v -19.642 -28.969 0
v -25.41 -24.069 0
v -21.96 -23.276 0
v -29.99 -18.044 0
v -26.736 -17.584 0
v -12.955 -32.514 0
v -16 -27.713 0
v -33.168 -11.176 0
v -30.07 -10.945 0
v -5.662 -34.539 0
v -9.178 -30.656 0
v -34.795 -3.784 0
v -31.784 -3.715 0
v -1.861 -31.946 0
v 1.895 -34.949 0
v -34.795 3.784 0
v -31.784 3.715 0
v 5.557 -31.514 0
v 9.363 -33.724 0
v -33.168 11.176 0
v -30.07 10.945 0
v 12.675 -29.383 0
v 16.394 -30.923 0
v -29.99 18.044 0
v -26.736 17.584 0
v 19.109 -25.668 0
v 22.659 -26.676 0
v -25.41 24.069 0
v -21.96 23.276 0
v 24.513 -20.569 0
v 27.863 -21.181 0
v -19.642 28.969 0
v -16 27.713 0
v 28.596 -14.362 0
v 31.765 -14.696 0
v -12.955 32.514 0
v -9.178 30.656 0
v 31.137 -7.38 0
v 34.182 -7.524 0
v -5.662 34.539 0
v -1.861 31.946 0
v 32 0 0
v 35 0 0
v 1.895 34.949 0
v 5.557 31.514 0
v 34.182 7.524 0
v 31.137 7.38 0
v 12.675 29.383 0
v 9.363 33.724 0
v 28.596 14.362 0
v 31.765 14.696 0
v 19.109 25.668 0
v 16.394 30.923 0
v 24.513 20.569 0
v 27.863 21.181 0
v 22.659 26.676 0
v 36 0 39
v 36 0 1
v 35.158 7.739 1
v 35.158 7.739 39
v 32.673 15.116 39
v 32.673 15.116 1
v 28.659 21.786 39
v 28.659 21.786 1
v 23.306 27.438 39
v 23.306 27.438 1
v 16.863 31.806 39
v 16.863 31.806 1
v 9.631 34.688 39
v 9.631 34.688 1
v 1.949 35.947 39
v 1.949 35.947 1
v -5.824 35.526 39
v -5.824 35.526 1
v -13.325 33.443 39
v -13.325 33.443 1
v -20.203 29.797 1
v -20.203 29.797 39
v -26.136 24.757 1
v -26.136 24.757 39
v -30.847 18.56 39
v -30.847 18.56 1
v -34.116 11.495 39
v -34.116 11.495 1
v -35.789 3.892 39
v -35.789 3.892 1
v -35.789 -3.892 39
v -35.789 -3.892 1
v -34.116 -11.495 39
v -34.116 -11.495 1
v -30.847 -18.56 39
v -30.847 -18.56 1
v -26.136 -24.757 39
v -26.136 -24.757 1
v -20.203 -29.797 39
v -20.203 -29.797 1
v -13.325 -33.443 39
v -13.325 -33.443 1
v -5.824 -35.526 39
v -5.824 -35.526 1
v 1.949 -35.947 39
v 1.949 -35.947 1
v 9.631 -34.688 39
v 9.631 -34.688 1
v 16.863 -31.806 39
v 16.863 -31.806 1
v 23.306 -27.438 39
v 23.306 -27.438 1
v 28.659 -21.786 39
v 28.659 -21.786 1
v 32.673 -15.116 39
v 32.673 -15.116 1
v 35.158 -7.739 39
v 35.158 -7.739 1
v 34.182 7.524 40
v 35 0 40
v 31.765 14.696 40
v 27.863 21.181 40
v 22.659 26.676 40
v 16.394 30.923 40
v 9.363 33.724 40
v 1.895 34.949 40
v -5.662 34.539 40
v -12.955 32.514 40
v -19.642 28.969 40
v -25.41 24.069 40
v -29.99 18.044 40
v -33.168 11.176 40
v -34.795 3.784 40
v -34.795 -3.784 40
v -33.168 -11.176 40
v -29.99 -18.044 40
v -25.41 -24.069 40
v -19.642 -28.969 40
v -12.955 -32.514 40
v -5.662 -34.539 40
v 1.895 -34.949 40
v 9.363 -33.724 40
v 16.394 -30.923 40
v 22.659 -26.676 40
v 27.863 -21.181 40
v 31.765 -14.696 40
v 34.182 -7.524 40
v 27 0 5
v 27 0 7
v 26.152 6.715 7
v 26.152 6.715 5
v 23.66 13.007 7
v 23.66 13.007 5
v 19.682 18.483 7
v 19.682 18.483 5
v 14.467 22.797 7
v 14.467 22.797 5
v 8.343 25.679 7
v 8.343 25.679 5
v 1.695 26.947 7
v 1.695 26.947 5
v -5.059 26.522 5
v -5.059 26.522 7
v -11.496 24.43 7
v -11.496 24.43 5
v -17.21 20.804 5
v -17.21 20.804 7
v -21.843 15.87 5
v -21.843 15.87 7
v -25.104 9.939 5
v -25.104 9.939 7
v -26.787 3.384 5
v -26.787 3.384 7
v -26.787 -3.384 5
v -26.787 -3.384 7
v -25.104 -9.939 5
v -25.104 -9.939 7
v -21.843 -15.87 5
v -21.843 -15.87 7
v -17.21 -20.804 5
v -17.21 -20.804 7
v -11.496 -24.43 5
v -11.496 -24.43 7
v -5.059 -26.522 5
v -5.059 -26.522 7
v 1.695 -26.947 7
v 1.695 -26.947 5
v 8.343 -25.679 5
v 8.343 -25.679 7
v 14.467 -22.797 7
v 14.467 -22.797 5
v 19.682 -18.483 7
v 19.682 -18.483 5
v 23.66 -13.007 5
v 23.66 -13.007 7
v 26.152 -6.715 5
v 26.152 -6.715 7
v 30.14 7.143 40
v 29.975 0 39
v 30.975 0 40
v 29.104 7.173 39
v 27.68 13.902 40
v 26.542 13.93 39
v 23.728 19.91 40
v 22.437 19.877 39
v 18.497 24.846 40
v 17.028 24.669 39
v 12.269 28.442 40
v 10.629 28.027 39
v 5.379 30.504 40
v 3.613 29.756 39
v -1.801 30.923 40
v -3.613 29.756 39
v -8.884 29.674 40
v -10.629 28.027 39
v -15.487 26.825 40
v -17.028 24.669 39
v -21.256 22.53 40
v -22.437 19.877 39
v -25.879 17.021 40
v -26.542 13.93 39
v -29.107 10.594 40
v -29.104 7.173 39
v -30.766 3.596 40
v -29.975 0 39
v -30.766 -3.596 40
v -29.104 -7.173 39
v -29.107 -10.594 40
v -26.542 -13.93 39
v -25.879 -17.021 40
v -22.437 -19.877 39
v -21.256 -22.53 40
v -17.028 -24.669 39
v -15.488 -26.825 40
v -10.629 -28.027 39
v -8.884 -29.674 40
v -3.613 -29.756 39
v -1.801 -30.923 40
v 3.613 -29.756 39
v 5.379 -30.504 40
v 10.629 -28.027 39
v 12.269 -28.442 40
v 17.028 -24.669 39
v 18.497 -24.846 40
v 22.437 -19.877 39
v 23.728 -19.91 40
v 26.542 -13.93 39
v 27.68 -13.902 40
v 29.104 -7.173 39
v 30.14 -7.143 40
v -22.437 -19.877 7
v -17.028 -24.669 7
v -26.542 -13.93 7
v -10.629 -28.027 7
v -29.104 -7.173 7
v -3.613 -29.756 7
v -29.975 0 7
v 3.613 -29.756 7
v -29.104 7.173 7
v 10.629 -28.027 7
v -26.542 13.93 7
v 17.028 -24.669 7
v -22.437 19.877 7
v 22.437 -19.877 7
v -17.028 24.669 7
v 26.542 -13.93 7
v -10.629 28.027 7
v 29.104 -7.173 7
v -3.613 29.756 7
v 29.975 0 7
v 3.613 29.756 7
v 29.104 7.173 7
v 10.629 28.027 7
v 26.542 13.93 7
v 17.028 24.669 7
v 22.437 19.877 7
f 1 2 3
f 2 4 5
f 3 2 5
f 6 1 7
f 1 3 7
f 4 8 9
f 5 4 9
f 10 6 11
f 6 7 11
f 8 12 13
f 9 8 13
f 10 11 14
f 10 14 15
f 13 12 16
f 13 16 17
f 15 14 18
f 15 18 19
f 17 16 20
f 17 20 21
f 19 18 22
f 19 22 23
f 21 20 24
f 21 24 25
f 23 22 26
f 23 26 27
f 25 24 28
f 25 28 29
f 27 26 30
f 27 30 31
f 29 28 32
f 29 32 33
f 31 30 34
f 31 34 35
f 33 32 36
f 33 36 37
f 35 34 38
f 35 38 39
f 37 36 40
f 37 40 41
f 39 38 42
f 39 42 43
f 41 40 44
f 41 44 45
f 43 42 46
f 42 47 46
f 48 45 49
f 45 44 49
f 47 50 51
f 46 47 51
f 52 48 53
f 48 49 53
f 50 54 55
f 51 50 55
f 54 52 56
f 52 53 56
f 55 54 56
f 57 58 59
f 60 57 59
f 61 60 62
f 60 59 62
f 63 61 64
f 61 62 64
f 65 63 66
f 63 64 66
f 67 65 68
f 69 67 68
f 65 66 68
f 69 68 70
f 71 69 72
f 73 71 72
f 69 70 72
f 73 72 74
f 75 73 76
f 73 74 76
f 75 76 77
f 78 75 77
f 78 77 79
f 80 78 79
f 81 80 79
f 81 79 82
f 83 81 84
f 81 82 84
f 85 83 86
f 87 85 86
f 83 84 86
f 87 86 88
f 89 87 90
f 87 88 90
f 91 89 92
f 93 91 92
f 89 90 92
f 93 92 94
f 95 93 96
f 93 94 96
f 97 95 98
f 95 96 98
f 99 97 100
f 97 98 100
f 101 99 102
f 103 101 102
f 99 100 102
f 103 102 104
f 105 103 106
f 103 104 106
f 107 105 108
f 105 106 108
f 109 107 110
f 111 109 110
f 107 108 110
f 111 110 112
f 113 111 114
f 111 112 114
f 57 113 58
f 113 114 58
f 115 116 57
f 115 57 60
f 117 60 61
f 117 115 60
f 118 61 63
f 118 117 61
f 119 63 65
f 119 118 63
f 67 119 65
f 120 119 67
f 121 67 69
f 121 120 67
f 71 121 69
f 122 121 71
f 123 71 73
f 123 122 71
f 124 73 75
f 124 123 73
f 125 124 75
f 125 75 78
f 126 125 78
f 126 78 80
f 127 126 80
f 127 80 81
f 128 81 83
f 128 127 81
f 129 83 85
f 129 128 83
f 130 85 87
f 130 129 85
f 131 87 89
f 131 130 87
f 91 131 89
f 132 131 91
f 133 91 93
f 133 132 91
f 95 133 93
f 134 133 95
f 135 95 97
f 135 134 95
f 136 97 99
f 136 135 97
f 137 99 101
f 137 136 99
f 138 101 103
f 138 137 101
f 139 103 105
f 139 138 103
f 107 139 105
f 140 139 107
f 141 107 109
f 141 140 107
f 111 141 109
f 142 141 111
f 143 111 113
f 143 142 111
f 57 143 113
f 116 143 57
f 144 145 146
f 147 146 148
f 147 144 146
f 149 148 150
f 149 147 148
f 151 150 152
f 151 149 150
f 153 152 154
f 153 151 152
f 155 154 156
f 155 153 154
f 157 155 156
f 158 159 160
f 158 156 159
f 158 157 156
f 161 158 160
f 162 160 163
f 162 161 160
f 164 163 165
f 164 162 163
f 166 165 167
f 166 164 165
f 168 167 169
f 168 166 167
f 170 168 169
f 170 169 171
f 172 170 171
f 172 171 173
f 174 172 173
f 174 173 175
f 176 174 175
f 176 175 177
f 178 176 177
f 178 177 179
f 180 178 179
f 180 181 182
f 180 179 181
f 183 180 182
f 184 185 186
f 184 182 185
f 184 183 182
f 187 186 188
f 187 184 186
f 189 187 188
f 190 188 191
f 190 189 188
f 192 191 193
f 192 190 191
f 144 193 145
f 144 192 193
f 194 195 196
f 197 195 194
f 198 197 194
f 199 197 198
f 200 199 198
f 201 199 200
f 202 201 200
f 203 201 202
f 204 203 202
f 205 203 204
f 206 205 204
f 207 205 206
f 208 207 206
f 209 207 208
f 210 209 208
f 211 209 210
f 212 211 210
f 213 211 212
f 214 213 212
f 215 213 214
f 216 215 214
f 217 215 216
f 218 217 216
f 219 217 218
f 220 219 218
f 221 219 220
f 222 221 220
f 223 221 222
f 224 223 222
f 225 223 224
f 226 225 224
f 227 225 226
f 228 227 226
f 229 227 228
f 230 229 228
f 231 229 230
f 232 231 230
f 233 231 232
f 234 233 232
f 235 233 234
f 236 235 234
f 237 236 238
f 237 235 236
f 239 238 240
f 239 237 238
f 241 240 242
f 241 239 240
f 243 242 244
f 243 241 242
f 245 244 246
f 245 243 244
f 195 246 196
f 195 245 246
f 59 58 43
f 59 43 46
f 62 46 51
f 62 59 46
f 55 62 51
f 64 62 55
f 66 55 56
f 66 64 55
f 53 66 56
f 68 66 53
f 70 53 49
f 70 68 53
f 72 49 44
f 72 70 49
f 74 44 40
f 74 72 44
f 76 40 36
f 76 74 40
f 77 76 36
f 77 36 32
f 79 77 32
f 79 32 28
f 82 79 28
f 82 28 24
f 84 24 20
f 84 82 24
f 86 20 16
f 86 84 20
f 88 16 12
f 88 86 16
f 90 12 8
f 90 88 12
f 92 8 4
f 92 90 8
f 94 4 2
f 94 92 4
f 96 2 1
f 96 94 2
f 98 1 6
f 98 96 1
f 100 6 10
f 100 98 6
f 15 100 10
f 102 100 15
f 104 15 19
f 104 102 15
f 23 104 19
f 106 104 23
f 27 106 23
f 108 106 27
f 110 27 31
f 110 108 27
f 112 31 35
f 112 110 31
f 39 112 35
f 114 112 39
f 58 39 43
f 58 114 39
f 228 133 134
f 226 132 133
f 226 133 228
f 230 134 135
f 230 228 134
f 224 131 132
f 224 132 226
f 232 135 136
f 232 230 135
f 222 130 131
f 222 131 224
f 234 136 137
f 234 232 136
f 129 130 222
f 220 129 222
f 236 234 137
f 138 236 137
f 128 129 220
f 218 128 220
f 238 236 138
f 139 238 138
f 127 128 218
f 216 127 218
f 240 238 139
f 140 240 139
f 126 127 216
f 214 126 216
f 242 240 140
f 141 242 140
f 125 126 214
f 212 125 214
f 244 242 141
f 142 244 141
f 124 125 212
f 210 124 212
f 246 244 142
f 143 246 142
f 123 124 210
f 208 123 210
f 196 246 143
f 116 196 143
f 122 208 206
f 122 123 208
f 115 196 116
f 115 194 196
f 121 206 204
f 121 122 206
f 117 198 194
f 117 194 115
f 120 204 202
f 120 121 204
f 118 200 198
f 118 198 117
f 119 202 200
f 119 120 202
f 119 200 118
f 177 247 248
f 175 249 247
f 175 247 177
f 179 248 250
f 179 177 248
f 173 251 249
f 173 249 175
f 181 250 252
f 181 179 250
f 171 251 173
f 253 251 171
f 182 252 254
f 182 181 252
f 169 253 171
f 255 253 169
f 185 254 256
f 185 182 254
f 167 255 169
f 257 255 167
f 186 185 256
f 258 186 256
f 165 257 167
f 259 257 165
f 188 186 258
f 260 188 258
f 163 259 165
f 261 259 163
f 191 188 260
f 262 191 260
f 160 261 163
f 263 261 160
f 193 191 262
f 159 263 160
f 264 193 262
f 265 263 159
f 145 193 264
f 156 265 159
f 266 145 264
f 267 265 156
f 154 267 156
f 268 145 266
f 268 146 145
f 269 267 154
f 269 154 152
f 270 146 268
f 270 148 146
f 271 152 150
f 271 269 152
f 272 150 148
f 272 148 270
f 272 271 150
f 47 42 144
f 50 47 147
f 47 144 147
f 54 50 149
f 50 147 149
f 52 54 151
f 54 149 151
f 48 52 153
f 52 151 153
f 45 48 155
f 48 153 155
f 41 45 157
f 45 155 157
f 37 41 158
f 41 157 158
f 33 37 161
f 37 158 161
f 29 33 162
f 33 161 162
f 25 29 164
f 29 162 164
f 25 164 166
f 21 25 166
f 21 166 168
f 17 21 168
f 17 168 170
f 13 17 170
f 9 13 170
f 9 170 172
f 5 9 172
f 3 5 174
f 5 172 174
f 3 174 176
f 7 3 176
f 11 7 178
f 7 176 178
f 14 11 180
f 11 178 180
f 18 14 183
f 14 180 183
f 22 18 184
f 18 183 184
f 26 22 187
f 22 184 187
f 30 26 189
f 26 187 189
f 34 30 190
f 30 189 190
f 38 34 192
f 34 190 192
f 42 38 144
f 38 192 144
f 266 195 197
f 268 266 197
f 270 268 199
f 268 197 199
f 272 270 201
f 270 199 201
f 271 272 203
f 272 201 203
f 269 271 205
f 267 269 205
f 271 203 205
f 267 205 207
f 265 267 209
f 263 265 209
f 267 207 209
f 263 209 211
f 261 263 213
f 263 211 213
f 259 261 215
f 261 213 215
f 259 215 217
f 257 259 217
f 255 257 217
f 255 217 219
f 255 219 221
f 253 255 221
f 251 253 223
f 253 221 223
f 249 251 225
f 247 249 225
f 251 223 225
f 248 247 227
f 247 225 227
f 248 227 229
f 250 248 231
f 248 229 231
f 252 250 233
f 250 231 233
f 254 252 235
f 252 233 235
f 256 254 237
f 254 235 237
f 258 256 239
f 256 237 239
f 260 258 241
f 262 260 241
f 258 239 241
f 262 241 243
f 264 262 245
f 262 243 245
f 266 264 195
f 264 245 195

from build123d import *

# Parameters (mm, degrees)
F0_R     = 36
F0_R_2   = 27
F1_DEPTH = 40
F2_R     = 29.975
F3_DEPTH = 33
F4_SIZE  = 5
F5_SIZE  = 1


with BuildPart() as f1:
    # F0 (on Top) → F1 (new body)
    with BuildSketch(Plane.XY):
        Circle(F0_R)
        Circle(F0_R_2, mode=Mode.SUBTRACT)
    extrude(amount=F1_DEPTH)

    # F2 (on face) → F3 (cut)
    with BuildSketch(Plane.XY.offset(40)):
        Circle(F2_R)
    extrude(amount=-F3_DEPTH, mode=Mode.SUBTRACT)

    # F4
    f4_edges = [f1.edges().sort_by_distance(p)[0] for p in [
        (-27, 0, 0),
    ]]
    chamfer(f4_edges, length=F4_SIZE)

    # F5
    f5_edges = [f1.edges().sort_by_distance(p)[0] for p in [
        (-36, 0, 0),
        (-36, 0, 40),
        (-29.975, 0, 40),
    ]]
    chamfer(f5_edges, length=F5_SIZE)


solid = f1.part
